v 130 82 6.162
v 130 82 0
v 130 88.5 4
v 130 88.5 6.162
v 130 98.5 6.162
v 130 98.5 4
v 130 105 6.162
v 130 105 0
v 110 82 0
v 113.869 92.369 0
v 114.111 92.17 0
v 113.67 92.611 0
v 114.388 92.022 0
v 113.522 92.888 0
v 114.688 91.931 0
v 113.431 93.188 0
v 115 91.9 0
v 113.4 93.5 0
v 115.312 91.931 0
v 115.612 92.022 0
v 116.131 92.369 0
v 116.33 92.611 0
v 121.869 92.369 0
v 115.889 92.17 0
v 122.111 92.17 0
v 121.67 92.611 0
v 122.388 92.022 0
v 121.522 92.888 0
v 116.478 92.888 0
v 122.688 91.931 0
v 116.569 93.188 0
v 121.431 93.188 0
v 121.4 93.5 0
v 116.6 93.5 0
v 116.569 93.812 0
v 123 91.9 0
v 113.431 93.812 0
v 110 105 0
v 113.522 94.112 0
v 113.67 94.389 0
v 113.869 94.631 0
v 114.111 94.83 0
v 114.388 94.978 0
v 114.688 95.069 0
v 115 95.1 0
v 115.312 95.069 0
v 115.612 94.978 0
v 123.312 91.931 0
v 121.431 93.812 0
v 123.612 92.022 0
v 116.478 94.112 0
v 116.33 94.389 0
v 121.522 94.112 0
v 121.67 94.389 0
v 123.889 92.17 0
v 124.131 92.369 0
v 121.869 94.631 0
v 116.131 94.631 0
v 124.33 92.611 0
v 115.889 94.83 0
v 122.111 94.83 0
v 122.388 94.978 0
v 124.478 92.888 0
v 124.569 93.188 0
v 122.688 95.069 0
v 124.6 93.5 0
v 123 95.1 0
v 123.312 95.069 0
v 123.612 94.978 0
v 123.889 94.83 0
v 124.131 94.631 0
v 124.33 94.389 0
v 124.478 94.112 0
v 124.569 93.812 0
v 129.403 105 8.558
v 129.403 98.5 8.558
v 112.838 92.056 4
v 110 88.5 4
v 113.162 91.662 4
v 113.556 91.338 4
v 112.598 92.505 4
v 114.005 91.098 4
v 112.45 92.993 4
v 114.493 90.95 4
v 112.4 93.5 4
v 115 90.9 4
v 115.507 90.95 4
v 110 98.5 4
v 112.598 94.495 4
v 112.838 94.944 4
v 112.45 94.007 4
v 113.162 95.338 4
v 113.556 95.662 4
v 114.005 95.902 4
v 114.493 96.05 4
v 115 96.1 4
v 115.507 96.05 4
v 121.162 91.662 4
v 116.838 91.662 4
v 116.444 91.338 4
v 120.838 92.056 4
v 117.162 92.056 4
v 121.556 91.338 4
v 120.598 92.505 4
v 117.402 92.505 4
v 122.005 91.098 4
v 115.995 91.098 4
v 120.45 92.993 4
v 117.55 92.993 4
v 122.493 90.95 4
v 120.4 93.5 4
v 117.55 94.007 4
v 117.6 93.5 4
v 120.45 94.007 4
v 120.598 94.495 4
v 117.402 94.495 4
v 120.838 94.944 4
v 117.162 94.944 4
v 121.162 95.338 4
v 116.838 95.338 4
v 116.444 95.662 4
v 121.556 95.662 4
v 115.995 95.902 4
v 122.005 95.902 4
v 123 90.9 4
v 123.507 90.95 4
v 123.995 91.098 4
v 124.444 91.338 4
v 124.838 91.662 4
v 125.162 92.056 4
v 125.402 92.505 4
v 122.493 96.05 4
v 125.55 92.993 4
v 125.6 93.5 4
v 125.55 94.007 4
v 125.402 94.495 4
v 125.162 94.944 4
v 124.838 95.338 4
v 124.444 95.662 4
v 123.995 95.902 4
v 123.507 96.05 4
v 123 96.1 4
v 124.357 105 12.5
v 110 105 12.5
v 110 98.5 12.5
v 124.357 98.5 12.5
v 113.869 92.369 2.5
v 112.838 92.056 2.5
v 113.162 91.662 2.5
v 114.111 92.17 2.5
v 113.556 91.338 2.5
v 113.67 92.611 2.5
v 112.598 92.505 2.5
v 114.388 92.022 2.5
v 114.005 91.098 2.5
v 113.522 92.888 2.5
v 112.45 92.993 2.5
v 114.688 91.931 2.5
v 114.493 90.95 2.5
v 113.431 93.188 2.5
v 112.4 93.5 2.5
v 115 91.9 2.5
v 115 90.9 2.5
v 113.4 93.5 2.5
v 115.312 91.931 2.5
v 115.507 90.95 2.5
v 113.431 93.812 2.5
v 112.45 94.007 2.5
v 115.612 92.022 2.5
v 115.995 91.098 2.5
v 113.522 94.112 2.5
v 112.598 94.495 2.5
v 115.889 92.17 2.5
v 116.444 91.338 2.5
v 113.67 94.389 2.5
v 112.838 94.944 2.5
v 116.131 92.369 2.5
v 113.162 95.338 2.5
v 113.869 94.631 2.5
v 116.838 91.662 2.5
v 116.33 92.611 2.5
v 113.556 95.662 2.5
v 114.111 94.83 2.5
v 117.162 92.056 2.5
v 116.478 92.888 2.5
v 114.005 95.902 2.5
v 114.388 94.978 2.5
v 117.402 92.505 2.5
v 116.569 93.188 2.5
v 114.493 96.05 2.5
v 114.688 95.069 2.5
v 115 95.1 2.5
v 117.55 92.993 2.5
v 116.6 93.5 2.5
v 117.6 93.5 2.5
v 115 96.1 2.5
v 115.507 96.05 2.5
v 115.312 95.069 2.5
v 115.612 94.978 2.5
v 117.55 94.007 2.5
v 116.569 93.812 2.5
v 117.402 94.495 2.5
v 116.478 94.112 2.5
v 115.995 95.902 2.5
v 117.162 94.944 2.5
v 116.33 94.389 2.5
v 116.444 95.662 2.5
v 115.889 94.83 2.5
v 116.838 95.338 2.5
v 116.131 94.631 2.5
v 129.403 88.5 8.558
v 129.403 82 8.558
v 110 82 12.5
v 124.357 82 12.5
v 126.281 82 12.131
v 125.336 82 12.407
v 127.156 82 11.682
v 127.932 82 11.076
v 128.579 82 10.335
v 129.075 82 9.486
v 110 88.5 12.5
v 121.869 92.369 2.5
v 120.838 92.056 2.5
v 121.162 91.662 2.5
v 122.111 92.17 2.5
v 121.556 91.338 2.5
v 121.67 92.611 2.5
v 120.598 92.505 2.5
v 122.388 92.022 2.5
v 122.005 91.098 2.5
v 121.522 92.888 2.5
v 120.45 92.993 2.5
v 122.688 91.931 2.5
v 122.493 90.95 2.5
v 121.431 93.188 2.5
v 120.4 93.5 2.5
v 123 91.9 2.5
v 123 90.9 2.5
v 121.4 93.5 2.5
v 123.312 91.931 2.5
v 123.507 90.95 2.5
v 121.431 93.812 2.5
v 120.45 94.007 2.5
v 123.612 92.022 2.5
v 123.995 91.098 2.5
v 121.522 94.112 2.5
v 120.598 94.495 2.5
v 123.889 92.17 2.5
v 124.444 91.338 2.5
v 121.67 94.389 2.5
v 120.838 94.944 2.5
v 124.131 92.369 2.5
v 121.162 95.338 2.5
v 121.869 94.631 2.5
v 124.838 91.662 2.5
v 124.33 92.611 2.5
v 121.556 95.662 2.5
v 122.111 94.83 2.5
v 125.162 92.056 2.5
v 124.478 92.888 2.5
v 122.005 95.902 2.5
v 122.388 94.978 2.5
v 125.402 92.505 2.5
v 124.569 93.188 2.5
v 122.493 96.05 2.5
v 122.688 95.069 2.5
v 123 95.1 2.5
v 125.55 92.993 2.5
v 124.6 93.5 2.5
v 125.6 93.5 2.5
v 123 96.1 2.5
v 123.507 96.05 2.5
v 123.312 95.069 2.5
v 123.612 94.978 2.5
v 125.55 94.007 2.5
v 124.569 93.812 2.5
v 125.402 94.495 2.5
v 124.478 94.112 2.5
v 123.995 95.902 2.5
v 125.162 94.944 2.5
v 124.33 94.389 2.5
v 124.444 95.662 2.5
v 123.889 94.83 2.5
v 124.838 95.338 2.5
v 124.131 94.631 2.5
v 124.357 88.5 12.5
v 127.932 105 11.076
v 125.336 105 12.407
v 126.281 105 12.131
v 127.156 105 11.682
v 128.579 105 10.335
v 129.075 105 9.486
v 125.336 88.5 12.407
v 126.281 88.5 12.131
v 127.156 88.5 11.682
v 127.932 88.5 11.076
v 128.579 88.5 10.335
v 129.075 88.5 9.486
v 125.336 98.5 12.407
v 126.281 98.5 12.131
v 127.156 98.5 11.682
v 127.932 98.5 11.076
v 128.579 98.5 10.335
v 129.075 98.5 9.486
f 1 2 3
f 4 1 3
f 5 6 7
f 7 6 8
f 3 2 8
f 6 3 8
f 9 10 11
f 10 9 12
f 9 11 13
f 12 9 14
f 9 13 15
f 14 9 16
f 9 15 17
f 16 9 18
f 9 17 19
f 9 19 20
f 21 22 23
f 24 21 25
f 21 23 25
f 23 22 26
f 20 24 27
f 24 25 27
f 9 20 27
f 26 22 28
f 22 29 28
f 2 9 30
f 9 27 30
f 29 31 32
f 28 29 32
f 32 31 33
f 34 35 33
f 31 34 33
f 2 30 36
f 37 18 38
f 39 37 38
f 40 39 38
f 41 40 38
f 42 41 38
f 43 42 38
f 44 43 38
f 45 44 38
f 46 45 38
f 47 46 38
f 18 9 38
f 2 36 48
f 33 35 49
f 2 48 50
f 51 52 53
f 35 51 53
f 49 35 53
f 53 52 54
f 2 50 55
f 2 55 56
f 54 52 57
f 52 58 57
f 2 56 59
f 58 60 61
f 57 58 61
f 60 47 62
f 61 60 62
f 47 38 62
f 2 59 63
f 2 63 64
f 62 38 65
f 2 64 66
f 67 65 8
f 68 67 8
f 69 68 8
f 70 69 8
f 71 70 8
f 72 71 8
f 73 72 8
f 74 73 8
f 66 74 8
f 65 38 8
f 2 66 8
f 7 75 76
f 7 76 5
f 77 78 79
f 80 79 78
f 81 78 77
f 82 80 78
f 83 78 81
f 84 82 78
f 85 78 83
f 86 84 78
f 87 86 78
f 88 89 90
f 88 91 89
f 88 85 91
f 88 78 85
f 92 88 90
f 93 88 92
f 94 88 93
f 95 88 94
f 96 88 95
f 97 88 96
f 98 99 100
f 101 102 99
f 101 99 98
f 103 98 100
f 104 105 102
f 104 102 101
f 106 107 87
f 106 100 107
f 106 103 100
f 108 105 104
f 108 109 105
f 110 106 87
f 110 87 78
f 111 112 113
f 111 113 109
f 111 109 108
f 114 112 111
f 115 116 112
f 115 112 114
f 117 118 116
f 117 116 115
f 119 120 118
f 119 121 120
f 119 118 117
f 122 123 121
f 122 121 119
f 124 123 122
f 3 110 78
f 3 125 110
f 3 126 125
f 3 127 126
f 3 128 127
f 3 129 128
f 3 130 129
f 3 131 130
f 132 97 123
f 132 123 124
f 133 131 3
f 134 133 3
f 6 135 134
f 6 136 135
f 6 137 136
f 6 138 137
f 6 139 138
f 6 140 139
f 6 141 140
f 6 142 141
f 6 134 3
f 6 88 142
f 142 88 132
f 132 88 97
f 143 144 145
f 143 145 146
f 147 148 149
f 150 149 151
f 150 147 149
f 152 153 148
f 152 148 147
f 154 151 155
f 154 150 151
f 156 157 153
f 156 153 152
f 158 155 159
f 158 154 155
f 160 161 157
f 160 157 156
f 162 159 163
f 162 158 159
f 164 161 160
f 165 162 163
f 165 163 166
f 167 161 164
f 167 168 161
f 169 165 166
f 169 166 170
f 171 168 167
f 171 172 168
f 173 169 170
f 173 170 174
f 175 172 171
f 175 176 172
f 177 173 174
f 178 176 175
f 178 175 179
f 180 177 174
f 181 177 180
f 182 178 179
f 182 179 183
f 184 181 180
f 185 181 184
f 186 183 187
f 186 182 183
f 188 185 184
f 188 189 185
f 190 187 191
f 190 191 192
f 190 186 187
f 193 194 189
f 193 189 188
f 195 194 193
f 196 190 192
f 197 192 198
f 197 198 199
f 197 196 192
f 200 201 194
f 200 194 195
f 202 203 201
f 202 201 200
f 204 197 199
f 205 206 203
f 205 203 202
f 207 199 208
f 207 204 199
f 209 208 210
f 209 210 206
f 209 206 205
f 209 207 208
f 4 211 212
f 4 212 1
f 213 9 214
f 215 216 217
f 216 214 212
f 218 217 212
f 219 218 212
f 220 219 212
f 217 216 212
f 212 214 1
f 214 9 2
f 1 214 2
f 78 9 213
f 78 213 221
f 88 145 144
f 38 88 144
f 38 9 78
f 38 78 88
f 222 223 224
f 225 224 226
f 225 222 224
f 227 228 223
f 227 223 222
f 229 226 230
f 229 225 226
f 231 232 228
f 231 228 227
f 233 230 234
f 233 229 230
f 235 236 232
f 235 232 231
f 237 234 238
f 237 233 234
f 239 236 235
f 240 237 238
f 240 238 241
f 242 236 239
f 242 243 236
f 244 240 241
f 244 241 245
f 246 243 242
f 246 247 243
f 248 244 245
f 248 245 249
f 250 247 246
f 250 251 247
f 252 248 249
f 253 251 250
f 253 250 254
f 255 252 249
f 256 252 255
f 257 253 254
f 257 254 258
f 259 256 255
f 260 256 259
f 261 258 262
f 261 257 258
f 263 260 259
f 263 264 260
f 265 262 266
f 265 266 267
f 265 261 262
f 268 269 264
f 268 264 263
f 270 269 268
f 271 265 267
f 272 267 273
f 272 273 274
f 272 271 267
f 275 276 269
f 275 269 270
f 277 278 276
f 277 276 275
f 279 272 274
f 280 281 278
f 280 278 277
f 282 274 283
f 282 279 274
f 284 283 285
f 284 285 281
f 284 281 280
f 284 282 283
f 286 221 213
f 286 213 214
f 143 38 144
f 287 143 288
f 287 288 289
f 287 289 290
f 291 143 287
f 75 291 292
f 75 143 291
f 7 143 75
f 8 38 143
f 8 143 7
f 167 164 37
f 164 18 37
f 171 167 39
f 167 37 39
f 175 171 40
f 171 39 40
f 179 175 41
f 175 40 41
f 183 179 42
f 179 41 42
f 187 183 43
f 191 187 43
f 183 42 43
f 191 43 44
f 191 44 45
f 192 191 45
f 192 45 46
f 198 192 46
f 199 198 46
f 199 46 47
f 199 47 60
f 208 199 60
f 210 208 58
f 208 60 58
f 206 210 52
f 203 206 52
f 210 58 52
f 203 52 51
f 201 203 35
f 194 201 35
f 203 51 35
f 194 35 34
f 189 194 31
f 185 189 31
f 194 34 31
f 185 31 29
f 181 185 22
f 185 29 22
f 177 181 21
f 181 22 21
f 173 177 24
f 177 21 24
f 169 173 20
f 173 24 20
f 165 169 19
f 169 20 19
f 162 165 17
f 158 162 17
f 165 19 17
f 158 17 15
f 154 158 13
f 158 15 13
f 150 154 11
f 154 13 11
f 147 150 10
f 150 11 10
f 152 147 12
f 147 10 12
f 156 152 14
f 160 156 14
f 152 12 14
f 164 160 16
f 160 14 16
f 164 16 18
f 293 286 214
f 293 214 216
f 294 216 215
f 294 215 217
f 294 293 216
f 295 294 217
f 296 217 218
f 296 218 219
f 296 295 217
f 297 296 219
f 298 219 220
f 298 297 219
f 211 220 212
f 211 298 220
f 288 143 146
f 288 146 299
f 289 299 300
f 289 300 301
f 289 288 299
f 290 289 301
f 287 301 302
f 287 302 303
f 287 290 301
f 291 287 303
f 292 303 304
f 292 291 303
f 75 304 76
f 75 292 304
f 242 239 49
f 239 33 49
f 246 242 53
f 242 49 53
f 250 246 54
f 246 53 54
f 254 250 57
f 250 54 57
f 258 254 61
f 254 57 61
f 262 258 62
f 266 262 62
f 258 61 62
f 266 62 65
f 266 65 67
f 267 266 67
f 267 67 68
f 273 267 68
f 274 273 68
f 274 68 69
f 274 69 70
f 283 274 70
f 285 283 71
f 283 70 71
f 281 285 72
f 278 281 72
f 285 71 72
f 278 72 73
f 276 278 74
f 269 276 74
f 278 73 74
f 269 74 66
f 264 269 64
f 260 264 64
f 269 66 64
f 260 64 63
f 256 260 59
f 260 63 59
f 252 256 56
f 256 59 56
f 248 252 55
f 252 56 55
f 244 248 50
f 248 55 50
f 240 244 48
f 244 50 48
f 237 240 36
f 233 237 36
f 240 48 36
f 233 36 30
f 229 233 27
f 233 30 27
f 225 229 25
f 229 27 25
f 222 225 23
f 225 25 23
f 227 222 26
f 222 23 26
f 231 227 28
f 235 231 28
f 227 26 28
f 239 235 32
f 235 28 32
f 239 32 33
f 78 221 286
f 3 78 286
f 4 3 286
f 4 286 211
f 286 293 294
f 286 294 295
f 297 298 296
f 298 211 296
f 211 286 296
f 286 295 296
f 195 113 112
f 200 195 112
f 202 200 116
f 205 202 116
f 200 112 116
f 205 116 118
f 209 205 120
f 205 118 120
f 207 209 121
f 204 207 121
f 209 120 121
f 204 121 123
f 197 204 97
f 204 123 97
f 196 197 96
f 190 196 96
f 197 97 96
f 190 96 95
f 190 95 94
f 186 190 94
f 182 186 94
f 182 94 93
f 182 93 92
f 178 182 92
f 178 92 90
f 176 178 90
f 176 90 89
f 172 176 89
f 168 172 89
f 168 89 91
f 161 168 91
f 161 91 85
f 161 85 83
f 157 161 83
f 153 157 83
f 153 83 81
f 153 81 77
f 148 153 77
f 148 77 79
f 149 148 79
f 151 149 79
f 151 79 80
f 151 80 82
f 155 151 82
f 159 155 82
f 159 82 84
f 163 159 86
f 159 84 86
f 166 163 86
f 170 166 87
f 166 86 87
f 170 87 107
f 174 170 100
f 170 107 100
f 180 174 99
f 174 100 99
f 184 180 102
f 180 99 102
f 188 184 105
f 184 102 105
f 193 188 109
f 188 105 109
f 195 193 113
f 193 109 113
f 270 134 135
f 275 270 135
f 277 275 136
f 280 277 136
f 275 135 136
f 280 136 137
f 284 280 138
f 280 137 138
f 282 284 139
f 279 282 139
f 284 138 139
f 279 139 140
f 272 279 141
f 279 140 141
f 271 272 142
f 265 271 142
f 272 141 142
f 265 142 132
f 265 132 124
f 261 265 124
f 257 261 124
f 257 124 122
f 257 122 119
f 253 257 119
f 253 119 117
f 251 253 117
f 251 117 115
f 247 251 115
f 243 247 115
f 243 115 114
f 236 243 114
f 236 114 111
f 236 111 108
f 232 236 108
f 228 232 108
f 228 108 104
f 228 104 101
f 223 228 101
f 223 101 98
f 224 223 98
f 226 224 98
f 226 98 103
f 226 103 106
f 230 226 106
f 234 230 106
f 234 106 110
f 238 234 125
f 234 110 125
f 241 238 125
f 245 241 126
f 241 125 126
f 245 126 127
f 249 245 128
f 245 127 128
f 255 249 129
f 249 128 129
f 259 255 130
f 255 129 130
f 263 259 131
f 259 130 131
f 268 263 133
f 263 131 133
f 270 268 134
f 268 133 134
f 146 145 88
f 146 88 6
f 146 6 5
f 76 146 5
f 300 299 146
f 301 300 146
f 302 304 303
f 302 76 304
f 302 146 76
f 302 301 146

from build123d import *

# Parameters (mm, degrees)
SKETCH_1_W                   = 20
SKETCH_1_H                   = 23
EXTRUDE_1_DEPTH              = 12.5
CUT_EXTRUDE_1_DEPTH          = 26.5
SKETCH_3_W                   = 20
SKETCH_3_H                   = 10
CUT_EXTRUDE_2_DEPTH          = 8.5
HOLE_WIZARD_M3_1_D           = 3.2
HOLE_WIZARD_M3_1_CBORE_D     = 5.2
HOLE_WIZARD_M3_1_CBORE_DEPTH = 1.5


with BuildPart() as part:
    # 草图1 → 凸台-拉伸1 (new body)
    with BuildSketch(Plane.XY):
        with Locations((120, 93.5)):
            Rectangle(SKETCH_1_W, SKETCH_1_H)
    extrude(amount=EXTRUDE_1_DEPTH)

    # 草图2 → 切除-拉伸1 (cut)
    with BuildSketch(Plane(origin=(0, 105, 0), x_dir=(1, 0, 0), z_dir=(0, 1, 0))):
        with BuildLine():
            Line((129.40254033, -8.557993857), (130, -6.161714003))
            Line((130, -6.161714003), (130, -12.5))
            Line((130, -12.5), (124.357002553, -12.5))
            ThreePointArc((124.357002553, -12.5), (127.558442225, -11.397655919), (129.40254033, -8.557993857))
        make_face()
    extrude(amount=-CUT_EXTRUDE_1_DEPTH, mode=Mode.SUBTRACT)

    # 草图3 → 切除-拉伸2 (cut)
    with BuildSketch(Plane.XY.offset(12.5)):
        with Locations((120, 93.5)):
            Rectangle(SKETCH_3_W, SKETCH_3_H)
    extrude(amount=-CUT_EXTRUDE_2_DEPTH, mode=Mode.SUBTRACT)

    # M3 六角头螺栓的柱形沉头孔1 (through all)
    with Locations(Plane.XY.offset(4)):
        with Locations((115, 93.5), (123, 93.5)):
            CounterBoreHole(HOLE_WIZARD_M3_1_D / 2, HOLE_WIZARD_M3_1_CBORE_D / 2, HOLE_WIZARD_M3_1_CBORE_DEPTH)


solid = part.part
